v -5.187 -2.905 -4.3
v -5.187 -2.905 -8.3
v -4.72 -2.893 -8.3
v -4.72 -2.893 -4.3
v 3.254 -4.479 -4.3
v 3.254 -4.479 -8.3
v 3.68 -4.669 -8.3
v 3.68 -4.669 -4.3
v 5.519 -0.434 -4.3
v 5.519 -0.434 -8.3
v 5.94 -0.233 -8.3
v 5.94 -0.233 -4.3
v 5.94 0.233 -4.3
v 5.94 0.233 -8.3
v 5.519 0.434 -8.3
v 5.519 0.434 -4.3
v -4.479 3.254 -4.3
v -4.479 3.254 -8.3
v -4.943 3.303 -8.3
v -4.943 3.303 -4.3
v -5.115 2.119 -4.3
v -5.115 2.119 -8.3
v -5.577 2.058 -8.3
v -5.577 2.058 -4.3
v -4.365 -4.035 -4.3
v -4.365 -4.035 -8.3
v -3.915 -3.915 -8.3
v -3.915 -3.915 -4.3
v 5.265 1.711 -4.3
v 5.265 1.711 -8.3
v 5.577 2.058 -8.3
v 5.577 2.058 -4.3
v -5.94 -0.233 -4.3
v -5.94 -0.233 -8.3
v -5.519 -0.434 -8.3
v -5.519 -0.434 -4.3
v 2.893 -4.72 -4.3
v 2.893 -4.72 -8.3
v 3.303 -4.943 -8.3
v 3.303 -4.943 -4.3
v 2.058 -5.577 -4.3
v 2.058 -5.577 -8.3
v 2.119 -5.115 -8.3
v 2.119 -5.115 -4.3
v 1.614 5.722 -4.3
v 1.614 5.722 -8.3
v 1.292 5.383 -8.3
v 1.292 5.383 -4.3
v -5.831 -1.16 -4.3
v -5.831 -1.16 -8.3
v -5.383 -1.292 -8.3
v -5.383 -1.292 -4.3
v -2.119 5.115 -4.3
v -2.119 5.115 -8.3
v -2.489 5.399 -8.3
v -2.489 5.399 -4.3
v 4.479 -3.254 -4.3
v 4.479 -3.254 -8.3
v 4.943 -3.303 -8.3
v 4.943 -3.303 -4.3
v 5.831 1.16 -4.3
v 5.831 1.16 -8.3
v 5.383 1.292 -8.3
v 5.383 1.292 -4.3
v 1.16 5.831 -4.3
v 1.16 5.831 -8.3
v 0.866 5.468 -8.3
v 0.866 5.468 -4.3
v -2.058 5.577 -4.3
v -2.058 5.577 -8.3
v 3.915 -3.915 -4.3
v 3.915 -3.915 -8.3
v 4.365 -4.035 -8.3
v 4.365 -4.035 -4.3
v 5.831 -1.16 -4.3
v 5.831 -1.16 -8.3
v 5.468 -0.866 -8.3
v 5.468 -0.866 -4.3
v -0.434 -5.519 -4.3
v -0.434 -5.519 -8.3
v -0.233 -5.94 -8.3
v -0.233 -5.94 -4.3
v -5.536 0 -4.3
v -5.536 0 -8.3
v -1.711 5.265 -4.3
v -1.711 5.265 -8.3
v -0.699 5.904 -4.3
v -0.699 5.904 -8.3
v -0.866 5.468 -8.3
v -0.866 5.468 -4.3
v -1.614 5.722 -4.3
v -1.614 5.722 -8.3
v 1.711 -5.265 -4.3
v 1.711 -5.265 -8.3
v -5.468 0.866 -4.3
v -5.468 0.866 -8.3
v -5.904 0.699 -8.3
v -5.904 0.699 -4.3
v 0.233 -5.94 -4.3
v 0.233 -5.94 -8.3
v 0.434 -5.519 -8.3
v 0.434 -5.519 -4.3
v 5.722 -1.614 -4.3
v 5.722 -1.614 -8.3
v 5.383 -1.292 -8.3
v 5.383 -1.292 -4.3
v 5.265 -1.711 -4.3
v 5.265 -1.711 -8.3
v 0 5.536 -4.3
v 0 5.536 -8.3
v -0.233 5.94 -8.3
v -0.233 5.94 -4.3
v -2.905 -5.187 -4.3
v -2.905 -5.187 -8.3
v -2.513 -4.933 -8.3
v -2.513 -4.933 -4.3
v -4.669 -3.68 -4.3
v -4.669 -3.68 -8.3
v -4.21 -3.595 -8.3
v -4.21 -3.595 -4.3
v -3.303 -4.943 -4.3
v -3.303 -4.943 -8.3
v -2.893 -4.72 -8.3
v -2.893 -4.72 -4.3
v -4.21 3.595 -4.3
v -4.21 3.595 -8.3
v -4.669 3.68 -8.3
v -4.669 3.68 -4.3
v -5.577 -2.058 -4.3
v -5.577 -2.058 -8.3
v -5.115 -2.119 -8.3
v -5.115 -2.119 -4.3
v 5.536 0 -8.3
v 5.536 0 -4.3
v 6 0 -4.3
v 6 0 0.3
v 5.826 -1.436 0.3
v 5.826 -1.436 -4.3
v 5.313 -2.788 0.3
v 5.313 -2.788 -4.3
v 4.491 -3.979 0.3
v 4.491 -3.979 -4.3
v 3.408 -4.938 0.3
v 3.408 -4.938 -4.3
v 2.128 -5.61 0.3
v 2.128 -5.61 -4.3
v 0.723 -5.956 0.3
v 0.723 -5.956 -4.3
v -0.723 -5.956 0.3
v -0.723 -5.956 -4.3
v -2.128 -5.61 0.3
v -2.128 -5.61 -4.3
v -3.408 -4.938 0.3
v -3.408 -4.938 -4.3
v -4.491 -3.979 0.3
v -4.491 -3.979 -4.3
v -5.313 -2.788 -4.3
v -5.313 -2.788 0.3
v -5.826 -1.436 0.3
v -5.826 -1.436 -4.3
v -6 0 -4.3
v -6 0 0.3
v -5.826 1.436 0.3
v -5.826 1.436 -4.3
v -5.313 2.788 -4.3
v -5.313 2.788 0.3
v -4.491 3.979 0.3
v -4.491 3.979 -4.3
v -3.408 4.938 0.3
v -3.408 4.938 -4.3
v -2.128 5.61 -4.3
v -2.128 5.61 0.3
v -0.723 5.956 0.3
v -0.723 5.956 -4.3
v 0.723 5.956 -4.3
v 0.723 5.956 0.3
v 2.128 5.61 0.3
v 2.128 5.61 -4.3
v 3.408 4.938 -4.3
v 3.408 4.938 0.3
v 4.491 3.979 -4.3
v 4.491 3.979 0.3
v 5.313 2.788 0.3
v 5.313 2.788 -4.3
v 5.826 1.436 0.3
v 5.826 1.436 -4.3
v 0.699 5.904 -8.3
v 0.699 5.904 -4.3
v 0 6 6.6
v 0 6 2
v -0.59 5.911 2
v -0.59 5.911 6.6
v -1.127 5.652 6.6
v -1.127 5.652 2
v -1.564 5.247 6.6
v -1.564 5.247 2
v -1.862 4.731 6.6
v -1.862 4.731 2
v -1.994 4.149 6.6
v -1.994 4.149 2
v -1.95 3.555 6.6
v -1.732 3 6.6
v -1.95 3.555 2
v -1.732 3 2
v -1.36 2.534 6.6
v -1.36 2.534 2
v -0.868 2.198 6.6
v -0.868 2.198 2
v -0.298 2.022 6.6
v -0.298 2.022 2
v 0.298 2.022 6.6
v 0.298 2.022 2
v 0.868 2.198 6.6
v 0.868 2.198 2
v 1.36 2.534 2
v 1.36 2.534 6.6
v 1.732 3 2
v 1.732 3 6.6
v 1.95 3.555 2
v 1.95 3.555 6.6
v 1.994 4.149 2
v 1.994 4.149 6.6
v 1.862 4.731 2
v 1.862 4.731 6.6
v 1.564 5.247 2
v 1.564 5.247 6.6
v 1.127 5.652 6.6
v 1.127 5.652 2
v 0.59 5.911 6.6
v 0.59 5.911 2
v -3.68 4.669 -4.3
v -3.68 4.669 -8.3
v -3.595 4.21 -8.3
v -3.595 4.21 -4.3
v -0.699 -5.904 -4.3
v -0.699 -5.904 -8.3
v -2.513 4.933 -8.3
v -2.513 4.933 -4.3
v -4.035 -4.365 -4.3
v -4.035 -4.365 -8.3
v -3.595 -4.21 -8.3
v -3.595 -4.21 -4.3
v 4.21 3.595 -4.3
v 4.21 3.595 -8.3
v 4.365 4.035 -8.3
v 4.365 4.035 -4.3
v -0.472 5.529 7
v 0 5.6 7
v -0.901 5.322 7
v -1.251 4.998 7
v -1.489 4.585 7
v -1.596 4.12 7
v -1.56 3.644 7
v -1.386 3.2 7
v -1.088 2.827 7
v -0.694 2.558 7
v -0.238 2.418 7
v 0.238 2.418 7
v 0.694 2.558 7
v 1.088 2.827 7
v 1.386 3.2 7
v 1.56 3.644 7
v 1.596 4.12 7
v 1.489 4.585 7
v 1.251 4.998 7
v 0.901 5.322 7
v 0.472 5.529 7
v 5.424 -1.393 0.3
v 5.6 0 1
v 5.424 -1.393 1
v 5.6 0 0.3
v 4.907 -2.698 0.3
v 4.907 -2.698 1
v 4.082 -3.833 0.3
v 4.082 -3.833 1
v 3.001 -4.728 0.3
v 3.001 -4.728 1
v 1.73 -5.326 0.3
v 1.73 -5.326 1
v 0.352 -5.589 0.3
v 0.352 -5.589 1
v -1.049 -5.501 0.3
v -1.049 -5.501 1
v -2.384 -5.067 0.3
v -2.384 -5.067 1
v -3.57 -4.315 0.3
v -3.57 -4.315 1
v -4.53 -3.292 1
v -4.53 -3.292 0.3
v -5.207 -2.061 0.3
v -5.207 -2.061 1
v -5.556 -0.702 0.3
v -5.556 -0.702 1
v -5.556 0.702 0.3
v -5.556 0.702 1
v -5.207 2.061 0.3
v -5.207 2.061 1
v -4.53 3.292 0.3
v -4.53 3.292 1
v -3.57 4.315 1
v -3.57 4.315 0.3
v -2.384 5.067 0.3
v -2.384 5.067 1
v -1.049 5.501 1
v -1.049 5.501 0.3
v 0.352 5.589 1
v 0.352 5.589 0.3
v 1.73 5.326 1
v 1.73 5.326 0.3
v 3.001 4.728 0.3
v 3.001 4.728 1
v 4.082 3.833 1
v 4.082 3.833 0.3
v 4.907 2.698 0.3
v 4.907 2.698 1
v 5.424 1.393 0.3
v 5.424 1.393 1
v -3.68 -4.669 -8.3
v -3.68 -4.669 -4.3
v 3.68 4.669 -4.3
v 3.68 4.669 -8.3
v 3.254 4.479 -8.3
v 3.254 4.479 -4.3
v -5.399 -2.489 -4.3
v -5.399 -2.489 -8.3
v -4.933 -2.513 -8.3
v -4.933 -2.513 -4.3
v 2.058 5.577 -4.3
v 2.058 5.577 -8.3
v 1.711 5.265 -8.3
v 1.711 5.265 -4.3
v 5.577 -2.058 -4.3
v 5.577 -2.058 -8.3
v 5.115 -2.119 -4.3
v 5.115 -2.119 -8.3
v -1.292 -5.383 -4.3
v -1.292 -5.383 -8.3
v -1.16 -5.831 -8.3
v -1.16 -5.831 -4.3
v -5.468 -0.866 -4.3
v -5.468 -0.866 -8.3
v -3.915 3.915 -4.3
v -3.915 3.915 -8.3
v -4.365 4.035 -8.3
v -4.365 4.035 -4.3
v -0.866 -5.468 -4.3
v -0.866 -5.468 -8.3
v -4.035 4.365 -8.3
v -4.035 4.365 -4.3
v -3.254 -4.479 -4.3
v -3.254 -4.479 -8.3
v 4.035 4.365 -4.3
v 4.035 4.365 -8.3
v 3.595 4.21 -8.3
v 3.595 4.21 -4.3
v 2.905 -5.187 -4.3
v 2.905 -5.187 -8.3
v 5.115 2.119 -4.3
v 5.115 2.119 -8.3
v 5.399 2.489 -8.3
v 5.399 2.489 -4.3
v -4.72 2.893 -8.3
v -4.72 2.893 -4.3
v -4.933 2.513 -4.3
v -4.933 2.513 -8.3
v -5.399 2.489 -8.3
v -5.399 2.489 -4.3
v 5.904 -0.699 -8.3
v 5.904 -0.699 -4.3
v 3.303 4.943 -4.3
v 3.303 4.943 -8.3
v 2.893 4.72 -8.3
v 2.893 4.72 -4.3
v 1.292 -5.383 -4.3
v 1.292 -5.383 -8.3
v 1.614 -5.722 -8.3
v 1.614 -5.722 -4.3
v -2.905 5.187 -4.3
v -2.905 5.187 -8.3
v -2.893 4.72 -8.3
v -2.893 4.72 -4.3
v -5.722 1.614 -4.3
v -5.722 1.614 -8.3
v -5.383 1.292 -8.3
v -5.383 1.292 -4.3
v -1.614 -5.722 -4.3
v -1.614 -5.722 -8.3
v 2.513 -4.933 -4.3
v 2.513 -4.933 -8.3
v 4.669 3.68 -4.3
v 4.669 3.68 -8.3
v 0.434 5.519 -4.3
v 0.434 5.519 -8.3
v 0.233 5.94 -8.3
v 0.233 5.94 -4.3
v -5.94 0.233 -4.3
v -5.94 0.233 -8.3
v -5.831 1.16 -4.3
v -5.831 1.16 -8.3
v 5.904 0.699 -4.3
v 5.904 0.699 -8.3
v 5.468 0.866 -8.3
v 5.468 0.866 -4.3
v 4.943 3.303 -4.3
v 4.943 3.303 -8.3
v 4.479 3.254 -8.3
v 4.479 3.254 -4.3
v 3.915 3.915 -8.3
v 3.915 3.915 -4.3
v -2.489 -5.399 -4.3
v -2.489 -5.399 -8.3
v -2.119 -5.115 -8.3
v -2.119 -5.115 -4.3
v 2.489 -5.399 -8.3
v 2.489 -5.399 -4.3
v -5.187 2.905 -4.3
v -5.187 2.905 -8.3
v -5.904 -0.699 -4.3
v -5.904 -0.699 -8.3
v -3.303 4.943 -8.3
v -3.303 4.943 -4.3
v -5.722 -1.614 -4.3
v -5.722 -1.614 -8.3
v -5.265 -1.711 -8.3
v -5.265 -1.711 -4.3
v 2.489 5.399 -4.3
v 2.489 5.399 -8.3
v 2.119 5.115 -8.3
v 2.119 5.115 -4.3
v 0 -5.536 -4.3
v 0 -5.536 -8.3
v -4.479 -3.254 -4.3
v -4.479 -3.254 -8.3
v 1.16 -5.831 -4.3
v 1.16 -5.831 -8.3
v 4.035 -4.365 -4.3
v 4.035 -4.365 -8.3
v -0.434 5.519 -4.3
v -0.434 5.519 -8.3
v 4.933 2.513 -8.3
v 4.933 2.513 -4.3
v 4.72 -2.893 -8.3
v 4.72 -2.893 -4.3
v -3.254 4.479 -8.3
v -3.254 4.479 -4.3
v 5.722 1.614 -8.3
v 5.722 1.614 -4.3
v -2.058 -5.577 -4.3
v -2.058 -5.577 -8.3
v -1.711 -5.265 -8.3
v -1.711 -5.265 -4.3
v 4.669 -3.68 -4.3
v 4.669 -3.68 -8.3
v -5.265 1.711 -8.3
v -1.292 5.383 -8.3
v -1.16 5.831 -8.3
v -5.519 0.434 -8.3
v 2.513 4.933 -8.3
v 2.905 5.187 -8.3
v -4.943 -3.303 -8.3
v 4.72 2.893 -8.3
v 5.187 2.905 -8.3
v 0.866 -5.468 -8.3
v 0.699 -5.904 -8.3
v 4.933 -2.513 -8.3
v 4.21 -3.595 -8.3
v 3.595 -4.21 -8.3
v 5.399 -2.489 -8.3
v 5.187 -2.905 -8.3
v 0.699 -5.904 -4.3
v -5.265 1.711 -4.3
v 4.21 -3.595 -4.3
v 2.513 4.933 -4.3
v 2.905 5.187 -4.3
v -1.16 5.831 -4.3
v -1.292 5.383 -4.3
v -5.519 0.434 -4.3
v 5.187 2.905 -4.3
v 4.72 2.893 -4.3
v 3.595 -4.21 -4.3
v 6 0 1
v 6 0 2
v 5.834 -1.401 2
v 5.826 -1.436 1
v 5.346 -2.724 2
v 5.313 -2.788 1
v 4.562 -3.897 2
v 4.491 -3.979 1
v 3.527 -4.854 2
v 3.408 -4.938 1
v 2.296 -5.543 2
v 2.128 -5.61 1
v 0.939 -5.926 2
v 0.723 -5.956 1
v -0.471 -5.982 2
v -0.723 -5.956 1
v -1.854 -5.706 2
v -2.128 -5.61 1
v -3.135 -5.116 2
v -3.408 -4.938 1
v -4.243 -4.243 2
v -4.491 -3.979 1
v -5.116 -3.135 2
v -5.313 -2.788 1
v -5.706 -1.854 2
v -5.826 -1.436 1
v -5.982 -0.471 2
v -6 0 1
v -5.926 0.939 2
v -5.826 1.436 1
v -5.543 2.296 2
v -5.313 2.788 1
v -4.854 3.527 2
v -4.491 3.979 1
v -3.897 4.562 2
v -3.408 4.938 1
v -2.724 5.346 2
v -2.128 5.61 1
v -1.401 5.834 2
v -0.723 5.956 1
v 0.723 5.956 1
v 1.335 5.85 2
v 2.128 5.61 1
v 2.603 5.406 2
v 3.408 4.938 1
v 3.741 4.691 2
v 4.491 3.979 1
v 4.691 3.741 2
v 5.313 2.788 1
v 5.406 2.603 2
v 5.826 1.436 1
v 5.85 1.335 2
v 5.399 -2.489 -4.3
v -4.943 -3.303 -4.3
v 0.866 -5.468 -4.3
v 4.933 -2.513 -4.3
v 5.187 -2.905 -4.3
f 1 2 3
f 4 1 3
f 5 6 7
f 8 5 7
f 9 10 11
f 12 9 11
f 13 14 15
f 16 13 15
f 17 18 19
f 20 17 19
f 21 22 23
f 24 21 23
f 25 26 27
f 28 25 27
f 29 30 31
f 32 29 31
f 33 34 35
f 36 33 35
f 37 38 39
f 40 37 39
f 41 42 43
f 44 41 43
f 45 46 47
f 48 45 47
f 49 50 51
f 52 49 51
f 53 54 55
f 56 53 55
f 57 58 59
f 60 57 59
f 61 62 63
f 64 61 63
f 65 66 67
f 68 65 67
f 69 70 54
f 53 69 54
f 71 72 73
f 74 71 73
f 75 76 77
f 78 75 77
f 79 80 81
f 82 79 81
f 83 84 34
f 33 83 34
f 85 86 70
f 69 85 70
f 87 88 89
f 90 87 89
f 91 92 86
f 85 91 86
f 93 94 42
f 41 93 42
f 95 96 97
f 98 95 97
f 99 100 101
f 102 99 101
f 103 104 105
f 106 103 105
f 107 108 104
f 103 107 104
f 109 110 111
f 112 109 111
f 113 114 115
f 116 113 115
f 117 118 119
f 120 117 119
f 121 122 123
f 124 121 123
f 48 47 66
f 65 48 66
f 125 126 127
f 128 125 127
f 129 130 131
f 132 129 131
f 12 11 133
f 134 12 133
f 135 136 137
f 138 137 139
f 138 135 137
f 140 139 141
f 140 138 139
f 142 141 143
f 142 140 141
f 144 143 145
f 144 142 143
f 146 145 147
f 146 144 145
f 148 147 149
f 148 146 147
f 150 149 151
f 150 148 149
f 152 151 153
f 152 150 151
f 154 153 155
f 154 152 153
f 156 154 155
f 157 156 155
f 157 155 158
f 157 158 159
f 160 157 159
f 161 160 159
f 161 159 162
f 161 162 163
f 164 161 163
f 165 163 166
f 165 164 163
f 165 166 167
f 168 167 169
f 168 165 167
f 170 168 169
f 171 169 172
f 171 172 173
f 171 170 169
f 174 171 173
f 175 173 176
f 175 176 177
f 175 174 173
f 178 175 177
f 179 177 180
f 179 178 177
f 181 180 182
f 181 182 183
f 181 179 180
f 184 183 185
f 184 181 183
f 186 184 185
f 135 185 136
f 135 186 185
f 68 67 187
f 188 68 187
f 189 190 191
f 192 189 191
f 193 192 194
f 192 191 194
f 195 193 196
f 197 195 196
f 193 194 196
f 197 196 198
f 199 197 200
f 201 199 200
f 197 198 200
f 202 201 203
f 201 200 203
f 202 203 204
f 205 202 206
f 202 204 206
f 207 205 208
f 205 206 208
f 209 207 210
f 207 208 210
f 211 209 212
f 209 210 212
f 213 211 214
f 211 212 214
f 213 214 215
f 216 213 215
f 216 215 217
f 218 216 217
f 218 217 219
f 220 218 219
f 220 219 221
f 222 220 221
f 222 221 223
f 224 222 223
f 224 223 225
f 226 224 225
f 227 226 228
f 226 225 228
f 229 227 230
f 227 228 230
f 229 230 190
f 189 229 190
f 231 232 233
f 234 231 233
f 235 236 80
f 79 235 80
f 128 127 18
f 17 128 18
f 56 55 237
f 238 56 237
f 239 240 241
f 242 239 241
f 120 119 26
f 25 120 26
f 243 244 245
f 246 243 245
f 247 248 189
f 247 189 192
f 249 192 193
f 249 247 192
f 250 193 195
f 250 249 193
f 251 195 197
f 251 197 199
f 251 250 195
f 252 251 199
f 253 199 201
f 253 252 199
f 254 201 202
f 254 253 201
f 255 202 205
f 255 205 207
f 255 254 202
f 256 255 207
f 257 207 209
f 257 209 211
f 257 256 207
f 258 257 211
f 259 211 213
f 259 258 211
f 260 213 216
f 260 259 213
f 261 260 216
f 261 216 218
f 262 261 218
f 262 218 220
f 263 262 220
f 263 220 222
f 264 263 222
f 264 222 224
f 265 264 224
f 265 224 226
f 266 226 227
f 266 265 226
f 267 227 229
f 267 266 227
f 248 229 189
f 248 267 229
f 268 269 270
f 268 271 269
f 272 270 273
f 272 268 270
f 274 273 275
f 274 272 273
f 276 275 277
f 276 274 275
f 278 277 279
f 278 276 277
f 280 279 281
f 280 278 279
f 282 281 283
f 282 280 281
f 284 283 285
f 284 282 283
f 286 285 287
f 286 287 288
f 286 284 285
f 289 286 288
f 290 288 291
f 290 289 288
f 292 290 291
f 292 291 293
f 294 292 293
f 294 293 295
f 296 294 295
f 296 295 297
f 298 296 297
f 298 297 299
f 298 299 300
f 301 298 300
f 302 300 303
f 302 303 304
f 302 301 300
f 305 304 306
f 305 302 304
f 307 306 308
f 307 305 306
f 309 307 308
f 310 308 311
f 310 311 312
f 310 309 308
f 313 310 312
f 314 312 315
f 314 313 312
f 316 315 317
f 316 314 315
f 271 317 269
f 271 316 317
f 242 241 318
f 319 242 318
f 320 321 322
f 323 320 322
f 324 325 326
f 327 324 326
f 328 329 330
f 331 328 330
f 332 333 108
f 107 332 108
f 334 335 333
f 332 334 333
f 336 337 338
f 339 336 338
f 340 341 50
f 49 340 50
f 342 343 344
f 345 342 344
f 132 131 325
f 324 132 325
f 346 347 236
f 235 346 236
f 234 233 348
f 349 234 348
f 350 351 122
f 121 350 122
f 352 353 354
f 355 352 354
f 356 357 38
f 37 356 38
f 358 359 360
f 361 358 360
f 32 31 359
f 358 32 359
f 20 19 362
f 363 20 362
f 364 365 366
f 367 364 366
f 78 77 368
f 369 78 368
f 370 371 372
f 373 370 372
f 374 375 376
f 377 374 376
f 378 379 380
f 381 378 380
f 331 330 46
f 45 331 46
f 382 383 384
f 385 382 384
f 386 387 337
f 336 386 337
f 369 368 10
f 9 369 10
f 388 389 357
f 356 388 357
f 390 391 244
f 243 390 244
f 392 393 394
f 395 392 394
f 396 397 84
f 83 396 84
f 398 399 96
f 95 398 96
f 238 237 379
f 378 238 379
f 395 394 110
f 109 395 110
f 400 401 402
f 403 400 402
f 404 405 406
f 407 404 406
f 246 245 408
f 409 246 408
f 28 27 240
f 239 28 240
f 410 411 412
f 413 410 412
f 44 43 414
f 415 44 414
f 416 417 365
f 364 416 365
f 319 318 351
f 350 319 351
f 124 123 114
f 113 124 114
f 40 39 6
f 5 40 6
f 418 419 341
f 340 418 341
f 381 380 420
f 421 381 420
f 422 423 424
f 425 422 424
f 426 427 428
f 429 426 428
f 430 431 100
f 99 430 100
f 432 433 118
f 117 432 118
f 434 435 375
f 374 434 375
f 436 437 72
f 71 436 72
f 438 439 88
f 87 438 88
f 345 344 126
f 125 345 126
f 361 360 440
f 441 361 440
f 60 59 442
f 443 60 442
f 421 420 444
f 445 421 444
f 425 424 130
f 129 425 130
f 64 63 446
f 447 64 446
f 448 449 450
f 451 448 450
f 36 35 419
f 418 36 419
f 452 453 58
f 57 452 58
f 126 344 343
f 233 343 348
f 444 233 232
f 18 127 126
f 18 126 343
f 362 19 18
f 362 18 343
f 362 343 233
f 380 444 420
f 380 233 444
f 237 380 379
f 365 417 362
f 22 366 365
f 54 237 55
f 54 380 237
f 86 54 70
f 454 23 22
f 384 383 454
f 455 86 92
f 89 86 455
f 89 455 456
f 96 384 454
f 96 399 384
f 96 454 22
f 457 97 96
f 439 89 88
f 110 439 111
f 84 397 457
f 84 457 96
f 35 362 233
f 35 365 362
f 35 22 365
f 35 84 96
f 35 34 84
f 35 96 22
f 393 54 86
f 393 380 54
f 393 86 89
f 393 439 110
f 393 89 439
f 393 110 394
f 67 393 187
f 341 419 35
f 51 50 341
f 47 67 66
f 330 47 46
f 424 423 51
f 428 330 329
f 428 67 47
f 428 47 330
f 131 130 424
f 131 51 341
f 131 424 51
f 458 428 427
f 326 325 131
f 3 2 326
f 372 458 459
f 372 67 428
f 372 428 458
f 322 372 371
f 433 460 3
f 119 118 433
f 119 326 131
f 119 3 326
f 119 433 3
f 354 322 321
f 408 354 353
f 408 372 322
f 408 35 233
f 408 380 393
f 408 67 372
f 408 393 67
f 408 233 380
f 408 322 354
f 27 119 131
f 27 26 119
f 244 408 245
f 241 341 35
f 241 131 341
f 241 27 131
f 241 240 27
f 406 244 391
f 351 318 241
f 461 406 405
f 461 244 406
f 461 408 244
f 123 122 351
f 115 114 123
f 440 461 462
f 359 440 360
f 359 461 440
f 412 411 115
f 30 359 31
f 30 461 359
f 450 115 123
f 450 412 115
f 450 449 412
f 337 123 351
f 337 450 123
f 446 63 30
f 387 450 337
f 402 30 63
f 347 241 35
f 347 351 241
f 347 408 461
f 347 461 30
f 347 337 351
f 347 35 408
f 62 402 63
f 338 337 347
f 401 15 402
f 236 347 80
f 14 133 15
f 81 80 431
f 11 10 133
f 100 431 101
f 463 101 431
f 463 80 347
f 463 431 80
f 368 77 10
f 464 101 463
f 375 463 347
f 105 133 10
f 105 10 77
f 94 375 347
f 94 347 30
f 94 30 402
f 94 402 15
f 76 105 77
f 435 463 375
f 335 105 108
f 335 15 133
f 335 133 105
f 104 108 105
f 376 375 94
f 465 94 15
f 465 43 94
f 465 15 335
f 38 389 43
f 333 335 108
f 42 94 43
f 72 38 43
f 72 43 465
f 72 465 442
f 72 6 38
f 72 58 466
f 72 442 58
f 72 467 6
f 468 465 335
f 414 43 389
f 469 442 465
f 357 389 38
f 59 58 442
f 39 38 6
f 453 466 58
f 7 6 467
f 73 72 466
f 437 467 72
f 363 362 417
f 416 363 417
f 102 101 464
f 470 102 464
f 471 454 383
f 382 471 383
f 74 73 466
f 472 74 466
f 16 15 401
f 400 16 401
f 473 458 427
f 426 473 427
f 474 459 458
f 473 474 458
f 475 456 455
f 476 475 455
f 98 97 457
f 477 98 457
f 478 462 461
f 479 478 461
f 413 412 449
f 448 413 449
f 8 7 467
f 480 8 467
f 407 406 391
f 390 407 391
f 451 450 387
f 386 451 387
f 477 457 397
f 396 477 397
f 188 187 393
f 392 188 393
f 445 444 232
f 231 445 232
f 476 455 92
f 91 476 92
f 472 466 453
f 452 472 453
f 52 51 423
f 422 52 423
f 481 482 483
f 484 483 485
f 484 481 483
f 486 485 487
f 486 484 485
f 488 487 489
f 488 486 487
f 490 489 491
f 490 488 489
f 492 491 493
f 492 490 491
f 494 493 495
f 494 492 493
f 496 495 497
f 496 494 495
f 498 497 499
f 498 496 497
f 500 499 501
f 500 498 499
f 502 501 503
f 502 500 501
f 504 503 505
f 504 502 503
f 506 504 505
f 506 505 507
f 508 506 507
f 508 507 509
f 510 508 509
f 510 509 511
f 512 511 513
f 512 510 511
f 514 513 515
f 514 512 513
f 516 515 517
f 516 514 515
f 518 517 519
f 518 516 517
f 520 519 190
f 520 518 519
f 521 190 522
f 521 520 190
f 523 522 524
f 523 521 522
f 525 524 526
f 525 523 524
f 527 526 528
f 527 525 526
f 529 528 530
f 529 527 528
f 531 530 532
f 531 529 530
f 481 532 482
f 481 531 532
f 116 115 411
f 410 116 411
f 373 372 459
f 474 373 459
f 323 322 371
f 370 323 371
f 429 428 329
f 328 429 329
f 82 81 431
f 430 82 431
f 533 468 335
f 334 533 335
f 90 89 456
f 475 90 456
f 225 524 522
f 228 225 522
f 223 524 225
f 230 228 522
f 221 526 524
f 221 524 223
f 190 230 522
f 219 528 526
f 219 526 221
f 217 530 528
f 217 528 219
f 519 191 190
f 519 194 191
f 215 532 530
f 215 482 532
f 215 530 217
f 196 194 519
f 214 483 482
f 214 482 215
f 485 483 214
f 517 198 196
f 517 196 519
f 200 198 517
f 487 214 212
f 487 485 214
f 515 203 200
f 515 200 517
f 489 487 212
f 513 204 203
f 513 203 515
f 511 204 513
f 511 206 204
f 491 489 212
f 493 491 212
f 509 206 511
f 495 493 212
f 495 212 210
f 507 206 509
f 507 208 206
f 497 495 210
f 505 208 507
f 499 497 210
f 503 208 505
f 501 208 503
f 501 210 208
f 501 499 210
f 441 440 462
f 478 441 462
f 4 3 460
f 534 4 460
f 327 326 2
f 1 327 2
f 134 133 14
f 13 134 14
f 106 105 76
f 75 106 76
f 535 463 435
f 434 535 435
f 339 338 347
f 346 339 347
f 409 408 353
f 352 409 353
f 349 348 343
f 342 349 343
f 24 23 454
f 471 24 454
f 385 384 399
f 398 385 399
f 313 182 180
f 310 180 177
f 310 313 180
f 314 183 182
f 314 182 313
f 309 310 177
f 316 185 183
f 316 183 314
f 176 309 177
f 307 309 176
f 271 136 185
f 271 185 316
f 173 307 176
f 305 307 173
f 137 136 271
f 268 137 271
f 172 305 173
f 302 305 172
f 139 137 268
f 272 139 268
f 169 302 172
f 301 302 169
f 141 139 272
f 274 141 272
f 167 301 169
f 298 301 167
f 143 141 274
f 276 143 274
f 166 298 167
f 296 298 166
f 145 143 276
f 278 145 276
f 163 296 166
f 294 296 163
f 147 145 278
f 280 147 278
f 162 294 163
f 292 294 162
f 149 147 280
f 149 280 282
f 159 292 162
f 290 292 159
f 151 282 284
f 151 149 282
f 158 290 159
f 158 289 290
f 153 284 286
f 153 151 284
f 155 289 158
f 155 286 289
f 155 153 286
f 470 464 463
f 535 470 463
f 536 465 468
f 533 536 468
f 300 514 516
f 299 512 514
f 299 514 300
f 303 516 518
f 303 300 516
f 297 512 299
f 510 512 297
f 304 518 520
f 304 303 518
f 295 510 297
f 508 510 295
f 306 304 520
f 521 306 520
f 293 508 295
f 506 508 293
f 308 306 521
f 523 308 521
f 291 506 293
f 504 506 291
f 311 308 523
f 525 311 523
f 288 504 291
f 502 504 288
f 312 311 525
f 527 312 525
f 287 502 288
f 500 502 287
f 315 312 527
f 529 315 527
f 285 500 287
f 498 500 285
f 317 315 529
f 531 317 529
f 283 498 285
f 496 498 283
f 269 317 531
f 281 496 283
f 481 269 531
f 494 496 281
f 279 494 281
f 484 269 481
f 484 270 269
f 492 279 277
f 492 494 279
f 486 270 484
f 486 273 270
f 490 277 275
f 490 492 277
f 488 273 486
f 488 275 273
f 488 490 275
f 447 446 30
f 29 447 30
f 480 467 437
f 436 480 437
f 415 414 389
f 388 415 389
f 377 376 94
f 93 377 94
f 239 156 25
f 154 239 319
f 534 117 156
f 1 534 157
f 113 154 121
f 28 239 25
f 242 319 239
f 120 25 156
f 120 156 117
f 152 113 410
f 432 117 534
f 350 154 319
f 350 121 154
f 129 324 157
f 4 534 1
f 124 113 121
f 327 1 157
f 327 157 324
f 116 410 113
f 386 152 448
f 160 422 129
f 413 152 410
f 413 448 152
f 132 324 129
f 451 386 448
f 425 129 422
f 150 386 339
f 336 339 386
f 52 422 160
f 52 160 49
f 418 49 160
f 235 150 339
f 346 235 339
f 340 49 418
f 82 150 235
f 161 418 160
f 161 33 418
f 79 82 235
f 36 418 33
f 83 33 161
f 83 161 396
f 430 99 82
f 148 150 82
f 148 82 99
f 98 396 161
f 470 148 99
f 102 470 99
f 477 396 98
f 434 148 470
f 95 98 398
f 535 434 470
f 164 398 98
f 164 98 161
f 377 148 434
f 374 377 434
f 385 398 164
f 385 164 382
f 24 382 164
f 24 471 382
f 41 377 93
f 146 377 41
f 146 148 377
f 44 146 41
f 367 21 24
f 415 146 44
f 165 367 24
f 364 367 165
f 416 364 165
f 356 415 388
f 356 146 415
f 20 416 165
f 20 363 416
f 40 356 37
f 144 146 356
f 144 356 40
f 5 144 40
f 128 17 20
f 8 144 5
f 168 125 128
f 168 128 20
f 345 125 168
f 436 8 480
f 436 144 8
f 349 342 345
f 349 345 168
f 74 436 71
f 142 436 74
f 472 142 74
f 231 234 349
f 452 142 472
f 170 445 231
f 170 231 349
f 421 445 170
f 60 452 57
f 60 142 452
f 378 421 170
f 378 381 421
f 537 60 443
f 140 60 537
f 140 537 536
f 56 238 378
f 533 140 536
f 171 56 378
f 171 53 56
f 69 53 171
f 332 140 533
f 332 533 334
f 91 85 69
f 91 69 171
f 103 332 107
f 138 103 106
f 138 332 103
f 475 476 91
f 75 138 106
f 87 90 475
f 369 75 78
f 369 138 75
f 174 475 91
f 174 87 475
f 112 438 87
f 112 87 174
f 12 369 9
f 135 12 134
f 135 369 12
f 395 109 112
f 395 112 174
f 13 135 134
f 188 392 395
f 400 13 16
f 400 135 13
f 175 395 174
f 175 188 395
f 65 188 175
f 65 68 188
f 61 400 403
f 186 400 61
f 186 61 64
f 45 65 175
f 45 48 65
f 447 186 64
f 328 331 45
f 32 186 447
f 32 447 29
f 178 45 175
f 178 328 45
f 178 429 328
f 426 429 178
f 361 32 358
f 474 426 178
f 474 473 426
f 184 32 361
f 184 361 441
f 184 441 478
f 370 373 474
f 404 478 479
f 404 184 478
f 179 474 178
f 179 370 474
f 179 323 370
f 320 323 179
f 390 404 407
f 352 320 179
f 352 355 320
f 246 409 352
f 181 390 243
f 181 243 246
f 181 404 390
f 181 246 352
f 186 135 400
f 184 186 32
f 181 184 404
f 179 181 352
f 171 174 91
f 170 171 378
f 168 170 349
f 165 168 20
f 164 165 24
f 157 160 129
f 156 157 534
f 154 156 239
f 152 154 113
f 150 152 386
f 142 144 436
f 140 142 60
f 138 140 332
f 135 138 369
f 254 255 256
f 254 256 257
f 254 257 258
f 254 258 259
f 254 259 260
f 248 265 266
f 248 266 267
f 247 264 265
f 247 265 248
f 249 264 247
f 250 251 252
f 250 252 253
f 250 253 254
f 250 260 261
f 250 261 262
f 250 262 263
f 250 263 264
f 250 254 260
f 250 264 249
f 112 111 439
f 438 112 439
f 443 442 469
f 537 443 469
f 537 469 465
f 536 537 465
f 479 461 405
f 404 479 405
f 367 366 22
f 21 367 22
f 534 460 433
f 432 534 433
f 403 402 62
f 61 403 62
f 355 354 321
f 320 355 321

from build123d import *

# Parameters (mm, degrees)
ESQUISSE2_R                  = 2
EXTRUSION1_DEPTH             = 5
CHANFREIN1_SIZE              = 0.4
ENL_V_MAT_EXTRU_1_DEPTH      = 4
R_P_TITION_CIRCULAIRE1_COUNT = 80
R_P_TITION_CIRCULAIRE1_ANGLE = 355.5


with BuildPart() as part:
    # Esquisse1 → Révolution1 (revolve)
    with BuildSketch(Plane(origin=(0, 0, 0), x_dir=(0, 0, -1), z_dir=(1, 0, 0)), mode=Mode.PRIVATE) as r_volution1_sk:
        Polygon((-0.3, 6), (8.3, 6), (8.3, 0), (-2, 0), (-2, 6), (-1, 6), (-1, 5.6), (-0.3, 5.6), align=None)
    revolve(r_volution1_sk.sketch.rotate(Axis((0, 0, 13.12672), (0, 0, -1)), 90), axis=Axis((0, 0, 13.12672), (0, 0, -1)))

    # Esquisse2 → Extrusion1 (add)
    with BuildSketch(Plane.XY.offset(2)):
        with Locations(Location((0, 4, 0), (0, 0, 90))):
            Circle(ESQUISSE2_R)
    extrude(amount=EXTRUSION1_DEPTH)

    # Chanfrein1
    chanfrein1_edges = [part.edges().sort_by_distance(p)[0] for p in [
        (0, 2, 7),
    ]]
    chamfer(chanfrein1_edges, length=CHANFREIN1_SIZE)

    # Esquisse3 → Enlèv. mat.-Extru.1 (cut)
    with BuildSketch(Plane(origin=(0, 0, -8.3), x_dir=(-1, 0, 0), z_dir=(0, 0, -1))):
        Polygon((-0.606501076, 6.586490679), (0, 5.536), (0.672676908, 6.701110581), align=None)
    enl_v_mat_extru_1 = extrude(amount=-ENL_V_MAT_EXTRU_1_DEPTH, mode=Mode.SUBTRACT)

    # Répétition circulaire1: Enlèv. mat.-Extru.1 ×80 about axis
    r_p_tition_circulaire1_axis = Axis((0, 0, 13.12672), (0, 0, -1))
    for i in range(1, R_P_TITION_CIRCULAIRE1_COUNT):
        add(enl_v_mat_extru_1.rotate(r_p_tition_circulaire1_axis, i * R_P_TITION_CIRCULAIRE1_ANGLE / (R_P_TITION_CIRCULAIRE1_COUNT - 1)), mode=Mode.SUBTRACT)


solid = part.part
